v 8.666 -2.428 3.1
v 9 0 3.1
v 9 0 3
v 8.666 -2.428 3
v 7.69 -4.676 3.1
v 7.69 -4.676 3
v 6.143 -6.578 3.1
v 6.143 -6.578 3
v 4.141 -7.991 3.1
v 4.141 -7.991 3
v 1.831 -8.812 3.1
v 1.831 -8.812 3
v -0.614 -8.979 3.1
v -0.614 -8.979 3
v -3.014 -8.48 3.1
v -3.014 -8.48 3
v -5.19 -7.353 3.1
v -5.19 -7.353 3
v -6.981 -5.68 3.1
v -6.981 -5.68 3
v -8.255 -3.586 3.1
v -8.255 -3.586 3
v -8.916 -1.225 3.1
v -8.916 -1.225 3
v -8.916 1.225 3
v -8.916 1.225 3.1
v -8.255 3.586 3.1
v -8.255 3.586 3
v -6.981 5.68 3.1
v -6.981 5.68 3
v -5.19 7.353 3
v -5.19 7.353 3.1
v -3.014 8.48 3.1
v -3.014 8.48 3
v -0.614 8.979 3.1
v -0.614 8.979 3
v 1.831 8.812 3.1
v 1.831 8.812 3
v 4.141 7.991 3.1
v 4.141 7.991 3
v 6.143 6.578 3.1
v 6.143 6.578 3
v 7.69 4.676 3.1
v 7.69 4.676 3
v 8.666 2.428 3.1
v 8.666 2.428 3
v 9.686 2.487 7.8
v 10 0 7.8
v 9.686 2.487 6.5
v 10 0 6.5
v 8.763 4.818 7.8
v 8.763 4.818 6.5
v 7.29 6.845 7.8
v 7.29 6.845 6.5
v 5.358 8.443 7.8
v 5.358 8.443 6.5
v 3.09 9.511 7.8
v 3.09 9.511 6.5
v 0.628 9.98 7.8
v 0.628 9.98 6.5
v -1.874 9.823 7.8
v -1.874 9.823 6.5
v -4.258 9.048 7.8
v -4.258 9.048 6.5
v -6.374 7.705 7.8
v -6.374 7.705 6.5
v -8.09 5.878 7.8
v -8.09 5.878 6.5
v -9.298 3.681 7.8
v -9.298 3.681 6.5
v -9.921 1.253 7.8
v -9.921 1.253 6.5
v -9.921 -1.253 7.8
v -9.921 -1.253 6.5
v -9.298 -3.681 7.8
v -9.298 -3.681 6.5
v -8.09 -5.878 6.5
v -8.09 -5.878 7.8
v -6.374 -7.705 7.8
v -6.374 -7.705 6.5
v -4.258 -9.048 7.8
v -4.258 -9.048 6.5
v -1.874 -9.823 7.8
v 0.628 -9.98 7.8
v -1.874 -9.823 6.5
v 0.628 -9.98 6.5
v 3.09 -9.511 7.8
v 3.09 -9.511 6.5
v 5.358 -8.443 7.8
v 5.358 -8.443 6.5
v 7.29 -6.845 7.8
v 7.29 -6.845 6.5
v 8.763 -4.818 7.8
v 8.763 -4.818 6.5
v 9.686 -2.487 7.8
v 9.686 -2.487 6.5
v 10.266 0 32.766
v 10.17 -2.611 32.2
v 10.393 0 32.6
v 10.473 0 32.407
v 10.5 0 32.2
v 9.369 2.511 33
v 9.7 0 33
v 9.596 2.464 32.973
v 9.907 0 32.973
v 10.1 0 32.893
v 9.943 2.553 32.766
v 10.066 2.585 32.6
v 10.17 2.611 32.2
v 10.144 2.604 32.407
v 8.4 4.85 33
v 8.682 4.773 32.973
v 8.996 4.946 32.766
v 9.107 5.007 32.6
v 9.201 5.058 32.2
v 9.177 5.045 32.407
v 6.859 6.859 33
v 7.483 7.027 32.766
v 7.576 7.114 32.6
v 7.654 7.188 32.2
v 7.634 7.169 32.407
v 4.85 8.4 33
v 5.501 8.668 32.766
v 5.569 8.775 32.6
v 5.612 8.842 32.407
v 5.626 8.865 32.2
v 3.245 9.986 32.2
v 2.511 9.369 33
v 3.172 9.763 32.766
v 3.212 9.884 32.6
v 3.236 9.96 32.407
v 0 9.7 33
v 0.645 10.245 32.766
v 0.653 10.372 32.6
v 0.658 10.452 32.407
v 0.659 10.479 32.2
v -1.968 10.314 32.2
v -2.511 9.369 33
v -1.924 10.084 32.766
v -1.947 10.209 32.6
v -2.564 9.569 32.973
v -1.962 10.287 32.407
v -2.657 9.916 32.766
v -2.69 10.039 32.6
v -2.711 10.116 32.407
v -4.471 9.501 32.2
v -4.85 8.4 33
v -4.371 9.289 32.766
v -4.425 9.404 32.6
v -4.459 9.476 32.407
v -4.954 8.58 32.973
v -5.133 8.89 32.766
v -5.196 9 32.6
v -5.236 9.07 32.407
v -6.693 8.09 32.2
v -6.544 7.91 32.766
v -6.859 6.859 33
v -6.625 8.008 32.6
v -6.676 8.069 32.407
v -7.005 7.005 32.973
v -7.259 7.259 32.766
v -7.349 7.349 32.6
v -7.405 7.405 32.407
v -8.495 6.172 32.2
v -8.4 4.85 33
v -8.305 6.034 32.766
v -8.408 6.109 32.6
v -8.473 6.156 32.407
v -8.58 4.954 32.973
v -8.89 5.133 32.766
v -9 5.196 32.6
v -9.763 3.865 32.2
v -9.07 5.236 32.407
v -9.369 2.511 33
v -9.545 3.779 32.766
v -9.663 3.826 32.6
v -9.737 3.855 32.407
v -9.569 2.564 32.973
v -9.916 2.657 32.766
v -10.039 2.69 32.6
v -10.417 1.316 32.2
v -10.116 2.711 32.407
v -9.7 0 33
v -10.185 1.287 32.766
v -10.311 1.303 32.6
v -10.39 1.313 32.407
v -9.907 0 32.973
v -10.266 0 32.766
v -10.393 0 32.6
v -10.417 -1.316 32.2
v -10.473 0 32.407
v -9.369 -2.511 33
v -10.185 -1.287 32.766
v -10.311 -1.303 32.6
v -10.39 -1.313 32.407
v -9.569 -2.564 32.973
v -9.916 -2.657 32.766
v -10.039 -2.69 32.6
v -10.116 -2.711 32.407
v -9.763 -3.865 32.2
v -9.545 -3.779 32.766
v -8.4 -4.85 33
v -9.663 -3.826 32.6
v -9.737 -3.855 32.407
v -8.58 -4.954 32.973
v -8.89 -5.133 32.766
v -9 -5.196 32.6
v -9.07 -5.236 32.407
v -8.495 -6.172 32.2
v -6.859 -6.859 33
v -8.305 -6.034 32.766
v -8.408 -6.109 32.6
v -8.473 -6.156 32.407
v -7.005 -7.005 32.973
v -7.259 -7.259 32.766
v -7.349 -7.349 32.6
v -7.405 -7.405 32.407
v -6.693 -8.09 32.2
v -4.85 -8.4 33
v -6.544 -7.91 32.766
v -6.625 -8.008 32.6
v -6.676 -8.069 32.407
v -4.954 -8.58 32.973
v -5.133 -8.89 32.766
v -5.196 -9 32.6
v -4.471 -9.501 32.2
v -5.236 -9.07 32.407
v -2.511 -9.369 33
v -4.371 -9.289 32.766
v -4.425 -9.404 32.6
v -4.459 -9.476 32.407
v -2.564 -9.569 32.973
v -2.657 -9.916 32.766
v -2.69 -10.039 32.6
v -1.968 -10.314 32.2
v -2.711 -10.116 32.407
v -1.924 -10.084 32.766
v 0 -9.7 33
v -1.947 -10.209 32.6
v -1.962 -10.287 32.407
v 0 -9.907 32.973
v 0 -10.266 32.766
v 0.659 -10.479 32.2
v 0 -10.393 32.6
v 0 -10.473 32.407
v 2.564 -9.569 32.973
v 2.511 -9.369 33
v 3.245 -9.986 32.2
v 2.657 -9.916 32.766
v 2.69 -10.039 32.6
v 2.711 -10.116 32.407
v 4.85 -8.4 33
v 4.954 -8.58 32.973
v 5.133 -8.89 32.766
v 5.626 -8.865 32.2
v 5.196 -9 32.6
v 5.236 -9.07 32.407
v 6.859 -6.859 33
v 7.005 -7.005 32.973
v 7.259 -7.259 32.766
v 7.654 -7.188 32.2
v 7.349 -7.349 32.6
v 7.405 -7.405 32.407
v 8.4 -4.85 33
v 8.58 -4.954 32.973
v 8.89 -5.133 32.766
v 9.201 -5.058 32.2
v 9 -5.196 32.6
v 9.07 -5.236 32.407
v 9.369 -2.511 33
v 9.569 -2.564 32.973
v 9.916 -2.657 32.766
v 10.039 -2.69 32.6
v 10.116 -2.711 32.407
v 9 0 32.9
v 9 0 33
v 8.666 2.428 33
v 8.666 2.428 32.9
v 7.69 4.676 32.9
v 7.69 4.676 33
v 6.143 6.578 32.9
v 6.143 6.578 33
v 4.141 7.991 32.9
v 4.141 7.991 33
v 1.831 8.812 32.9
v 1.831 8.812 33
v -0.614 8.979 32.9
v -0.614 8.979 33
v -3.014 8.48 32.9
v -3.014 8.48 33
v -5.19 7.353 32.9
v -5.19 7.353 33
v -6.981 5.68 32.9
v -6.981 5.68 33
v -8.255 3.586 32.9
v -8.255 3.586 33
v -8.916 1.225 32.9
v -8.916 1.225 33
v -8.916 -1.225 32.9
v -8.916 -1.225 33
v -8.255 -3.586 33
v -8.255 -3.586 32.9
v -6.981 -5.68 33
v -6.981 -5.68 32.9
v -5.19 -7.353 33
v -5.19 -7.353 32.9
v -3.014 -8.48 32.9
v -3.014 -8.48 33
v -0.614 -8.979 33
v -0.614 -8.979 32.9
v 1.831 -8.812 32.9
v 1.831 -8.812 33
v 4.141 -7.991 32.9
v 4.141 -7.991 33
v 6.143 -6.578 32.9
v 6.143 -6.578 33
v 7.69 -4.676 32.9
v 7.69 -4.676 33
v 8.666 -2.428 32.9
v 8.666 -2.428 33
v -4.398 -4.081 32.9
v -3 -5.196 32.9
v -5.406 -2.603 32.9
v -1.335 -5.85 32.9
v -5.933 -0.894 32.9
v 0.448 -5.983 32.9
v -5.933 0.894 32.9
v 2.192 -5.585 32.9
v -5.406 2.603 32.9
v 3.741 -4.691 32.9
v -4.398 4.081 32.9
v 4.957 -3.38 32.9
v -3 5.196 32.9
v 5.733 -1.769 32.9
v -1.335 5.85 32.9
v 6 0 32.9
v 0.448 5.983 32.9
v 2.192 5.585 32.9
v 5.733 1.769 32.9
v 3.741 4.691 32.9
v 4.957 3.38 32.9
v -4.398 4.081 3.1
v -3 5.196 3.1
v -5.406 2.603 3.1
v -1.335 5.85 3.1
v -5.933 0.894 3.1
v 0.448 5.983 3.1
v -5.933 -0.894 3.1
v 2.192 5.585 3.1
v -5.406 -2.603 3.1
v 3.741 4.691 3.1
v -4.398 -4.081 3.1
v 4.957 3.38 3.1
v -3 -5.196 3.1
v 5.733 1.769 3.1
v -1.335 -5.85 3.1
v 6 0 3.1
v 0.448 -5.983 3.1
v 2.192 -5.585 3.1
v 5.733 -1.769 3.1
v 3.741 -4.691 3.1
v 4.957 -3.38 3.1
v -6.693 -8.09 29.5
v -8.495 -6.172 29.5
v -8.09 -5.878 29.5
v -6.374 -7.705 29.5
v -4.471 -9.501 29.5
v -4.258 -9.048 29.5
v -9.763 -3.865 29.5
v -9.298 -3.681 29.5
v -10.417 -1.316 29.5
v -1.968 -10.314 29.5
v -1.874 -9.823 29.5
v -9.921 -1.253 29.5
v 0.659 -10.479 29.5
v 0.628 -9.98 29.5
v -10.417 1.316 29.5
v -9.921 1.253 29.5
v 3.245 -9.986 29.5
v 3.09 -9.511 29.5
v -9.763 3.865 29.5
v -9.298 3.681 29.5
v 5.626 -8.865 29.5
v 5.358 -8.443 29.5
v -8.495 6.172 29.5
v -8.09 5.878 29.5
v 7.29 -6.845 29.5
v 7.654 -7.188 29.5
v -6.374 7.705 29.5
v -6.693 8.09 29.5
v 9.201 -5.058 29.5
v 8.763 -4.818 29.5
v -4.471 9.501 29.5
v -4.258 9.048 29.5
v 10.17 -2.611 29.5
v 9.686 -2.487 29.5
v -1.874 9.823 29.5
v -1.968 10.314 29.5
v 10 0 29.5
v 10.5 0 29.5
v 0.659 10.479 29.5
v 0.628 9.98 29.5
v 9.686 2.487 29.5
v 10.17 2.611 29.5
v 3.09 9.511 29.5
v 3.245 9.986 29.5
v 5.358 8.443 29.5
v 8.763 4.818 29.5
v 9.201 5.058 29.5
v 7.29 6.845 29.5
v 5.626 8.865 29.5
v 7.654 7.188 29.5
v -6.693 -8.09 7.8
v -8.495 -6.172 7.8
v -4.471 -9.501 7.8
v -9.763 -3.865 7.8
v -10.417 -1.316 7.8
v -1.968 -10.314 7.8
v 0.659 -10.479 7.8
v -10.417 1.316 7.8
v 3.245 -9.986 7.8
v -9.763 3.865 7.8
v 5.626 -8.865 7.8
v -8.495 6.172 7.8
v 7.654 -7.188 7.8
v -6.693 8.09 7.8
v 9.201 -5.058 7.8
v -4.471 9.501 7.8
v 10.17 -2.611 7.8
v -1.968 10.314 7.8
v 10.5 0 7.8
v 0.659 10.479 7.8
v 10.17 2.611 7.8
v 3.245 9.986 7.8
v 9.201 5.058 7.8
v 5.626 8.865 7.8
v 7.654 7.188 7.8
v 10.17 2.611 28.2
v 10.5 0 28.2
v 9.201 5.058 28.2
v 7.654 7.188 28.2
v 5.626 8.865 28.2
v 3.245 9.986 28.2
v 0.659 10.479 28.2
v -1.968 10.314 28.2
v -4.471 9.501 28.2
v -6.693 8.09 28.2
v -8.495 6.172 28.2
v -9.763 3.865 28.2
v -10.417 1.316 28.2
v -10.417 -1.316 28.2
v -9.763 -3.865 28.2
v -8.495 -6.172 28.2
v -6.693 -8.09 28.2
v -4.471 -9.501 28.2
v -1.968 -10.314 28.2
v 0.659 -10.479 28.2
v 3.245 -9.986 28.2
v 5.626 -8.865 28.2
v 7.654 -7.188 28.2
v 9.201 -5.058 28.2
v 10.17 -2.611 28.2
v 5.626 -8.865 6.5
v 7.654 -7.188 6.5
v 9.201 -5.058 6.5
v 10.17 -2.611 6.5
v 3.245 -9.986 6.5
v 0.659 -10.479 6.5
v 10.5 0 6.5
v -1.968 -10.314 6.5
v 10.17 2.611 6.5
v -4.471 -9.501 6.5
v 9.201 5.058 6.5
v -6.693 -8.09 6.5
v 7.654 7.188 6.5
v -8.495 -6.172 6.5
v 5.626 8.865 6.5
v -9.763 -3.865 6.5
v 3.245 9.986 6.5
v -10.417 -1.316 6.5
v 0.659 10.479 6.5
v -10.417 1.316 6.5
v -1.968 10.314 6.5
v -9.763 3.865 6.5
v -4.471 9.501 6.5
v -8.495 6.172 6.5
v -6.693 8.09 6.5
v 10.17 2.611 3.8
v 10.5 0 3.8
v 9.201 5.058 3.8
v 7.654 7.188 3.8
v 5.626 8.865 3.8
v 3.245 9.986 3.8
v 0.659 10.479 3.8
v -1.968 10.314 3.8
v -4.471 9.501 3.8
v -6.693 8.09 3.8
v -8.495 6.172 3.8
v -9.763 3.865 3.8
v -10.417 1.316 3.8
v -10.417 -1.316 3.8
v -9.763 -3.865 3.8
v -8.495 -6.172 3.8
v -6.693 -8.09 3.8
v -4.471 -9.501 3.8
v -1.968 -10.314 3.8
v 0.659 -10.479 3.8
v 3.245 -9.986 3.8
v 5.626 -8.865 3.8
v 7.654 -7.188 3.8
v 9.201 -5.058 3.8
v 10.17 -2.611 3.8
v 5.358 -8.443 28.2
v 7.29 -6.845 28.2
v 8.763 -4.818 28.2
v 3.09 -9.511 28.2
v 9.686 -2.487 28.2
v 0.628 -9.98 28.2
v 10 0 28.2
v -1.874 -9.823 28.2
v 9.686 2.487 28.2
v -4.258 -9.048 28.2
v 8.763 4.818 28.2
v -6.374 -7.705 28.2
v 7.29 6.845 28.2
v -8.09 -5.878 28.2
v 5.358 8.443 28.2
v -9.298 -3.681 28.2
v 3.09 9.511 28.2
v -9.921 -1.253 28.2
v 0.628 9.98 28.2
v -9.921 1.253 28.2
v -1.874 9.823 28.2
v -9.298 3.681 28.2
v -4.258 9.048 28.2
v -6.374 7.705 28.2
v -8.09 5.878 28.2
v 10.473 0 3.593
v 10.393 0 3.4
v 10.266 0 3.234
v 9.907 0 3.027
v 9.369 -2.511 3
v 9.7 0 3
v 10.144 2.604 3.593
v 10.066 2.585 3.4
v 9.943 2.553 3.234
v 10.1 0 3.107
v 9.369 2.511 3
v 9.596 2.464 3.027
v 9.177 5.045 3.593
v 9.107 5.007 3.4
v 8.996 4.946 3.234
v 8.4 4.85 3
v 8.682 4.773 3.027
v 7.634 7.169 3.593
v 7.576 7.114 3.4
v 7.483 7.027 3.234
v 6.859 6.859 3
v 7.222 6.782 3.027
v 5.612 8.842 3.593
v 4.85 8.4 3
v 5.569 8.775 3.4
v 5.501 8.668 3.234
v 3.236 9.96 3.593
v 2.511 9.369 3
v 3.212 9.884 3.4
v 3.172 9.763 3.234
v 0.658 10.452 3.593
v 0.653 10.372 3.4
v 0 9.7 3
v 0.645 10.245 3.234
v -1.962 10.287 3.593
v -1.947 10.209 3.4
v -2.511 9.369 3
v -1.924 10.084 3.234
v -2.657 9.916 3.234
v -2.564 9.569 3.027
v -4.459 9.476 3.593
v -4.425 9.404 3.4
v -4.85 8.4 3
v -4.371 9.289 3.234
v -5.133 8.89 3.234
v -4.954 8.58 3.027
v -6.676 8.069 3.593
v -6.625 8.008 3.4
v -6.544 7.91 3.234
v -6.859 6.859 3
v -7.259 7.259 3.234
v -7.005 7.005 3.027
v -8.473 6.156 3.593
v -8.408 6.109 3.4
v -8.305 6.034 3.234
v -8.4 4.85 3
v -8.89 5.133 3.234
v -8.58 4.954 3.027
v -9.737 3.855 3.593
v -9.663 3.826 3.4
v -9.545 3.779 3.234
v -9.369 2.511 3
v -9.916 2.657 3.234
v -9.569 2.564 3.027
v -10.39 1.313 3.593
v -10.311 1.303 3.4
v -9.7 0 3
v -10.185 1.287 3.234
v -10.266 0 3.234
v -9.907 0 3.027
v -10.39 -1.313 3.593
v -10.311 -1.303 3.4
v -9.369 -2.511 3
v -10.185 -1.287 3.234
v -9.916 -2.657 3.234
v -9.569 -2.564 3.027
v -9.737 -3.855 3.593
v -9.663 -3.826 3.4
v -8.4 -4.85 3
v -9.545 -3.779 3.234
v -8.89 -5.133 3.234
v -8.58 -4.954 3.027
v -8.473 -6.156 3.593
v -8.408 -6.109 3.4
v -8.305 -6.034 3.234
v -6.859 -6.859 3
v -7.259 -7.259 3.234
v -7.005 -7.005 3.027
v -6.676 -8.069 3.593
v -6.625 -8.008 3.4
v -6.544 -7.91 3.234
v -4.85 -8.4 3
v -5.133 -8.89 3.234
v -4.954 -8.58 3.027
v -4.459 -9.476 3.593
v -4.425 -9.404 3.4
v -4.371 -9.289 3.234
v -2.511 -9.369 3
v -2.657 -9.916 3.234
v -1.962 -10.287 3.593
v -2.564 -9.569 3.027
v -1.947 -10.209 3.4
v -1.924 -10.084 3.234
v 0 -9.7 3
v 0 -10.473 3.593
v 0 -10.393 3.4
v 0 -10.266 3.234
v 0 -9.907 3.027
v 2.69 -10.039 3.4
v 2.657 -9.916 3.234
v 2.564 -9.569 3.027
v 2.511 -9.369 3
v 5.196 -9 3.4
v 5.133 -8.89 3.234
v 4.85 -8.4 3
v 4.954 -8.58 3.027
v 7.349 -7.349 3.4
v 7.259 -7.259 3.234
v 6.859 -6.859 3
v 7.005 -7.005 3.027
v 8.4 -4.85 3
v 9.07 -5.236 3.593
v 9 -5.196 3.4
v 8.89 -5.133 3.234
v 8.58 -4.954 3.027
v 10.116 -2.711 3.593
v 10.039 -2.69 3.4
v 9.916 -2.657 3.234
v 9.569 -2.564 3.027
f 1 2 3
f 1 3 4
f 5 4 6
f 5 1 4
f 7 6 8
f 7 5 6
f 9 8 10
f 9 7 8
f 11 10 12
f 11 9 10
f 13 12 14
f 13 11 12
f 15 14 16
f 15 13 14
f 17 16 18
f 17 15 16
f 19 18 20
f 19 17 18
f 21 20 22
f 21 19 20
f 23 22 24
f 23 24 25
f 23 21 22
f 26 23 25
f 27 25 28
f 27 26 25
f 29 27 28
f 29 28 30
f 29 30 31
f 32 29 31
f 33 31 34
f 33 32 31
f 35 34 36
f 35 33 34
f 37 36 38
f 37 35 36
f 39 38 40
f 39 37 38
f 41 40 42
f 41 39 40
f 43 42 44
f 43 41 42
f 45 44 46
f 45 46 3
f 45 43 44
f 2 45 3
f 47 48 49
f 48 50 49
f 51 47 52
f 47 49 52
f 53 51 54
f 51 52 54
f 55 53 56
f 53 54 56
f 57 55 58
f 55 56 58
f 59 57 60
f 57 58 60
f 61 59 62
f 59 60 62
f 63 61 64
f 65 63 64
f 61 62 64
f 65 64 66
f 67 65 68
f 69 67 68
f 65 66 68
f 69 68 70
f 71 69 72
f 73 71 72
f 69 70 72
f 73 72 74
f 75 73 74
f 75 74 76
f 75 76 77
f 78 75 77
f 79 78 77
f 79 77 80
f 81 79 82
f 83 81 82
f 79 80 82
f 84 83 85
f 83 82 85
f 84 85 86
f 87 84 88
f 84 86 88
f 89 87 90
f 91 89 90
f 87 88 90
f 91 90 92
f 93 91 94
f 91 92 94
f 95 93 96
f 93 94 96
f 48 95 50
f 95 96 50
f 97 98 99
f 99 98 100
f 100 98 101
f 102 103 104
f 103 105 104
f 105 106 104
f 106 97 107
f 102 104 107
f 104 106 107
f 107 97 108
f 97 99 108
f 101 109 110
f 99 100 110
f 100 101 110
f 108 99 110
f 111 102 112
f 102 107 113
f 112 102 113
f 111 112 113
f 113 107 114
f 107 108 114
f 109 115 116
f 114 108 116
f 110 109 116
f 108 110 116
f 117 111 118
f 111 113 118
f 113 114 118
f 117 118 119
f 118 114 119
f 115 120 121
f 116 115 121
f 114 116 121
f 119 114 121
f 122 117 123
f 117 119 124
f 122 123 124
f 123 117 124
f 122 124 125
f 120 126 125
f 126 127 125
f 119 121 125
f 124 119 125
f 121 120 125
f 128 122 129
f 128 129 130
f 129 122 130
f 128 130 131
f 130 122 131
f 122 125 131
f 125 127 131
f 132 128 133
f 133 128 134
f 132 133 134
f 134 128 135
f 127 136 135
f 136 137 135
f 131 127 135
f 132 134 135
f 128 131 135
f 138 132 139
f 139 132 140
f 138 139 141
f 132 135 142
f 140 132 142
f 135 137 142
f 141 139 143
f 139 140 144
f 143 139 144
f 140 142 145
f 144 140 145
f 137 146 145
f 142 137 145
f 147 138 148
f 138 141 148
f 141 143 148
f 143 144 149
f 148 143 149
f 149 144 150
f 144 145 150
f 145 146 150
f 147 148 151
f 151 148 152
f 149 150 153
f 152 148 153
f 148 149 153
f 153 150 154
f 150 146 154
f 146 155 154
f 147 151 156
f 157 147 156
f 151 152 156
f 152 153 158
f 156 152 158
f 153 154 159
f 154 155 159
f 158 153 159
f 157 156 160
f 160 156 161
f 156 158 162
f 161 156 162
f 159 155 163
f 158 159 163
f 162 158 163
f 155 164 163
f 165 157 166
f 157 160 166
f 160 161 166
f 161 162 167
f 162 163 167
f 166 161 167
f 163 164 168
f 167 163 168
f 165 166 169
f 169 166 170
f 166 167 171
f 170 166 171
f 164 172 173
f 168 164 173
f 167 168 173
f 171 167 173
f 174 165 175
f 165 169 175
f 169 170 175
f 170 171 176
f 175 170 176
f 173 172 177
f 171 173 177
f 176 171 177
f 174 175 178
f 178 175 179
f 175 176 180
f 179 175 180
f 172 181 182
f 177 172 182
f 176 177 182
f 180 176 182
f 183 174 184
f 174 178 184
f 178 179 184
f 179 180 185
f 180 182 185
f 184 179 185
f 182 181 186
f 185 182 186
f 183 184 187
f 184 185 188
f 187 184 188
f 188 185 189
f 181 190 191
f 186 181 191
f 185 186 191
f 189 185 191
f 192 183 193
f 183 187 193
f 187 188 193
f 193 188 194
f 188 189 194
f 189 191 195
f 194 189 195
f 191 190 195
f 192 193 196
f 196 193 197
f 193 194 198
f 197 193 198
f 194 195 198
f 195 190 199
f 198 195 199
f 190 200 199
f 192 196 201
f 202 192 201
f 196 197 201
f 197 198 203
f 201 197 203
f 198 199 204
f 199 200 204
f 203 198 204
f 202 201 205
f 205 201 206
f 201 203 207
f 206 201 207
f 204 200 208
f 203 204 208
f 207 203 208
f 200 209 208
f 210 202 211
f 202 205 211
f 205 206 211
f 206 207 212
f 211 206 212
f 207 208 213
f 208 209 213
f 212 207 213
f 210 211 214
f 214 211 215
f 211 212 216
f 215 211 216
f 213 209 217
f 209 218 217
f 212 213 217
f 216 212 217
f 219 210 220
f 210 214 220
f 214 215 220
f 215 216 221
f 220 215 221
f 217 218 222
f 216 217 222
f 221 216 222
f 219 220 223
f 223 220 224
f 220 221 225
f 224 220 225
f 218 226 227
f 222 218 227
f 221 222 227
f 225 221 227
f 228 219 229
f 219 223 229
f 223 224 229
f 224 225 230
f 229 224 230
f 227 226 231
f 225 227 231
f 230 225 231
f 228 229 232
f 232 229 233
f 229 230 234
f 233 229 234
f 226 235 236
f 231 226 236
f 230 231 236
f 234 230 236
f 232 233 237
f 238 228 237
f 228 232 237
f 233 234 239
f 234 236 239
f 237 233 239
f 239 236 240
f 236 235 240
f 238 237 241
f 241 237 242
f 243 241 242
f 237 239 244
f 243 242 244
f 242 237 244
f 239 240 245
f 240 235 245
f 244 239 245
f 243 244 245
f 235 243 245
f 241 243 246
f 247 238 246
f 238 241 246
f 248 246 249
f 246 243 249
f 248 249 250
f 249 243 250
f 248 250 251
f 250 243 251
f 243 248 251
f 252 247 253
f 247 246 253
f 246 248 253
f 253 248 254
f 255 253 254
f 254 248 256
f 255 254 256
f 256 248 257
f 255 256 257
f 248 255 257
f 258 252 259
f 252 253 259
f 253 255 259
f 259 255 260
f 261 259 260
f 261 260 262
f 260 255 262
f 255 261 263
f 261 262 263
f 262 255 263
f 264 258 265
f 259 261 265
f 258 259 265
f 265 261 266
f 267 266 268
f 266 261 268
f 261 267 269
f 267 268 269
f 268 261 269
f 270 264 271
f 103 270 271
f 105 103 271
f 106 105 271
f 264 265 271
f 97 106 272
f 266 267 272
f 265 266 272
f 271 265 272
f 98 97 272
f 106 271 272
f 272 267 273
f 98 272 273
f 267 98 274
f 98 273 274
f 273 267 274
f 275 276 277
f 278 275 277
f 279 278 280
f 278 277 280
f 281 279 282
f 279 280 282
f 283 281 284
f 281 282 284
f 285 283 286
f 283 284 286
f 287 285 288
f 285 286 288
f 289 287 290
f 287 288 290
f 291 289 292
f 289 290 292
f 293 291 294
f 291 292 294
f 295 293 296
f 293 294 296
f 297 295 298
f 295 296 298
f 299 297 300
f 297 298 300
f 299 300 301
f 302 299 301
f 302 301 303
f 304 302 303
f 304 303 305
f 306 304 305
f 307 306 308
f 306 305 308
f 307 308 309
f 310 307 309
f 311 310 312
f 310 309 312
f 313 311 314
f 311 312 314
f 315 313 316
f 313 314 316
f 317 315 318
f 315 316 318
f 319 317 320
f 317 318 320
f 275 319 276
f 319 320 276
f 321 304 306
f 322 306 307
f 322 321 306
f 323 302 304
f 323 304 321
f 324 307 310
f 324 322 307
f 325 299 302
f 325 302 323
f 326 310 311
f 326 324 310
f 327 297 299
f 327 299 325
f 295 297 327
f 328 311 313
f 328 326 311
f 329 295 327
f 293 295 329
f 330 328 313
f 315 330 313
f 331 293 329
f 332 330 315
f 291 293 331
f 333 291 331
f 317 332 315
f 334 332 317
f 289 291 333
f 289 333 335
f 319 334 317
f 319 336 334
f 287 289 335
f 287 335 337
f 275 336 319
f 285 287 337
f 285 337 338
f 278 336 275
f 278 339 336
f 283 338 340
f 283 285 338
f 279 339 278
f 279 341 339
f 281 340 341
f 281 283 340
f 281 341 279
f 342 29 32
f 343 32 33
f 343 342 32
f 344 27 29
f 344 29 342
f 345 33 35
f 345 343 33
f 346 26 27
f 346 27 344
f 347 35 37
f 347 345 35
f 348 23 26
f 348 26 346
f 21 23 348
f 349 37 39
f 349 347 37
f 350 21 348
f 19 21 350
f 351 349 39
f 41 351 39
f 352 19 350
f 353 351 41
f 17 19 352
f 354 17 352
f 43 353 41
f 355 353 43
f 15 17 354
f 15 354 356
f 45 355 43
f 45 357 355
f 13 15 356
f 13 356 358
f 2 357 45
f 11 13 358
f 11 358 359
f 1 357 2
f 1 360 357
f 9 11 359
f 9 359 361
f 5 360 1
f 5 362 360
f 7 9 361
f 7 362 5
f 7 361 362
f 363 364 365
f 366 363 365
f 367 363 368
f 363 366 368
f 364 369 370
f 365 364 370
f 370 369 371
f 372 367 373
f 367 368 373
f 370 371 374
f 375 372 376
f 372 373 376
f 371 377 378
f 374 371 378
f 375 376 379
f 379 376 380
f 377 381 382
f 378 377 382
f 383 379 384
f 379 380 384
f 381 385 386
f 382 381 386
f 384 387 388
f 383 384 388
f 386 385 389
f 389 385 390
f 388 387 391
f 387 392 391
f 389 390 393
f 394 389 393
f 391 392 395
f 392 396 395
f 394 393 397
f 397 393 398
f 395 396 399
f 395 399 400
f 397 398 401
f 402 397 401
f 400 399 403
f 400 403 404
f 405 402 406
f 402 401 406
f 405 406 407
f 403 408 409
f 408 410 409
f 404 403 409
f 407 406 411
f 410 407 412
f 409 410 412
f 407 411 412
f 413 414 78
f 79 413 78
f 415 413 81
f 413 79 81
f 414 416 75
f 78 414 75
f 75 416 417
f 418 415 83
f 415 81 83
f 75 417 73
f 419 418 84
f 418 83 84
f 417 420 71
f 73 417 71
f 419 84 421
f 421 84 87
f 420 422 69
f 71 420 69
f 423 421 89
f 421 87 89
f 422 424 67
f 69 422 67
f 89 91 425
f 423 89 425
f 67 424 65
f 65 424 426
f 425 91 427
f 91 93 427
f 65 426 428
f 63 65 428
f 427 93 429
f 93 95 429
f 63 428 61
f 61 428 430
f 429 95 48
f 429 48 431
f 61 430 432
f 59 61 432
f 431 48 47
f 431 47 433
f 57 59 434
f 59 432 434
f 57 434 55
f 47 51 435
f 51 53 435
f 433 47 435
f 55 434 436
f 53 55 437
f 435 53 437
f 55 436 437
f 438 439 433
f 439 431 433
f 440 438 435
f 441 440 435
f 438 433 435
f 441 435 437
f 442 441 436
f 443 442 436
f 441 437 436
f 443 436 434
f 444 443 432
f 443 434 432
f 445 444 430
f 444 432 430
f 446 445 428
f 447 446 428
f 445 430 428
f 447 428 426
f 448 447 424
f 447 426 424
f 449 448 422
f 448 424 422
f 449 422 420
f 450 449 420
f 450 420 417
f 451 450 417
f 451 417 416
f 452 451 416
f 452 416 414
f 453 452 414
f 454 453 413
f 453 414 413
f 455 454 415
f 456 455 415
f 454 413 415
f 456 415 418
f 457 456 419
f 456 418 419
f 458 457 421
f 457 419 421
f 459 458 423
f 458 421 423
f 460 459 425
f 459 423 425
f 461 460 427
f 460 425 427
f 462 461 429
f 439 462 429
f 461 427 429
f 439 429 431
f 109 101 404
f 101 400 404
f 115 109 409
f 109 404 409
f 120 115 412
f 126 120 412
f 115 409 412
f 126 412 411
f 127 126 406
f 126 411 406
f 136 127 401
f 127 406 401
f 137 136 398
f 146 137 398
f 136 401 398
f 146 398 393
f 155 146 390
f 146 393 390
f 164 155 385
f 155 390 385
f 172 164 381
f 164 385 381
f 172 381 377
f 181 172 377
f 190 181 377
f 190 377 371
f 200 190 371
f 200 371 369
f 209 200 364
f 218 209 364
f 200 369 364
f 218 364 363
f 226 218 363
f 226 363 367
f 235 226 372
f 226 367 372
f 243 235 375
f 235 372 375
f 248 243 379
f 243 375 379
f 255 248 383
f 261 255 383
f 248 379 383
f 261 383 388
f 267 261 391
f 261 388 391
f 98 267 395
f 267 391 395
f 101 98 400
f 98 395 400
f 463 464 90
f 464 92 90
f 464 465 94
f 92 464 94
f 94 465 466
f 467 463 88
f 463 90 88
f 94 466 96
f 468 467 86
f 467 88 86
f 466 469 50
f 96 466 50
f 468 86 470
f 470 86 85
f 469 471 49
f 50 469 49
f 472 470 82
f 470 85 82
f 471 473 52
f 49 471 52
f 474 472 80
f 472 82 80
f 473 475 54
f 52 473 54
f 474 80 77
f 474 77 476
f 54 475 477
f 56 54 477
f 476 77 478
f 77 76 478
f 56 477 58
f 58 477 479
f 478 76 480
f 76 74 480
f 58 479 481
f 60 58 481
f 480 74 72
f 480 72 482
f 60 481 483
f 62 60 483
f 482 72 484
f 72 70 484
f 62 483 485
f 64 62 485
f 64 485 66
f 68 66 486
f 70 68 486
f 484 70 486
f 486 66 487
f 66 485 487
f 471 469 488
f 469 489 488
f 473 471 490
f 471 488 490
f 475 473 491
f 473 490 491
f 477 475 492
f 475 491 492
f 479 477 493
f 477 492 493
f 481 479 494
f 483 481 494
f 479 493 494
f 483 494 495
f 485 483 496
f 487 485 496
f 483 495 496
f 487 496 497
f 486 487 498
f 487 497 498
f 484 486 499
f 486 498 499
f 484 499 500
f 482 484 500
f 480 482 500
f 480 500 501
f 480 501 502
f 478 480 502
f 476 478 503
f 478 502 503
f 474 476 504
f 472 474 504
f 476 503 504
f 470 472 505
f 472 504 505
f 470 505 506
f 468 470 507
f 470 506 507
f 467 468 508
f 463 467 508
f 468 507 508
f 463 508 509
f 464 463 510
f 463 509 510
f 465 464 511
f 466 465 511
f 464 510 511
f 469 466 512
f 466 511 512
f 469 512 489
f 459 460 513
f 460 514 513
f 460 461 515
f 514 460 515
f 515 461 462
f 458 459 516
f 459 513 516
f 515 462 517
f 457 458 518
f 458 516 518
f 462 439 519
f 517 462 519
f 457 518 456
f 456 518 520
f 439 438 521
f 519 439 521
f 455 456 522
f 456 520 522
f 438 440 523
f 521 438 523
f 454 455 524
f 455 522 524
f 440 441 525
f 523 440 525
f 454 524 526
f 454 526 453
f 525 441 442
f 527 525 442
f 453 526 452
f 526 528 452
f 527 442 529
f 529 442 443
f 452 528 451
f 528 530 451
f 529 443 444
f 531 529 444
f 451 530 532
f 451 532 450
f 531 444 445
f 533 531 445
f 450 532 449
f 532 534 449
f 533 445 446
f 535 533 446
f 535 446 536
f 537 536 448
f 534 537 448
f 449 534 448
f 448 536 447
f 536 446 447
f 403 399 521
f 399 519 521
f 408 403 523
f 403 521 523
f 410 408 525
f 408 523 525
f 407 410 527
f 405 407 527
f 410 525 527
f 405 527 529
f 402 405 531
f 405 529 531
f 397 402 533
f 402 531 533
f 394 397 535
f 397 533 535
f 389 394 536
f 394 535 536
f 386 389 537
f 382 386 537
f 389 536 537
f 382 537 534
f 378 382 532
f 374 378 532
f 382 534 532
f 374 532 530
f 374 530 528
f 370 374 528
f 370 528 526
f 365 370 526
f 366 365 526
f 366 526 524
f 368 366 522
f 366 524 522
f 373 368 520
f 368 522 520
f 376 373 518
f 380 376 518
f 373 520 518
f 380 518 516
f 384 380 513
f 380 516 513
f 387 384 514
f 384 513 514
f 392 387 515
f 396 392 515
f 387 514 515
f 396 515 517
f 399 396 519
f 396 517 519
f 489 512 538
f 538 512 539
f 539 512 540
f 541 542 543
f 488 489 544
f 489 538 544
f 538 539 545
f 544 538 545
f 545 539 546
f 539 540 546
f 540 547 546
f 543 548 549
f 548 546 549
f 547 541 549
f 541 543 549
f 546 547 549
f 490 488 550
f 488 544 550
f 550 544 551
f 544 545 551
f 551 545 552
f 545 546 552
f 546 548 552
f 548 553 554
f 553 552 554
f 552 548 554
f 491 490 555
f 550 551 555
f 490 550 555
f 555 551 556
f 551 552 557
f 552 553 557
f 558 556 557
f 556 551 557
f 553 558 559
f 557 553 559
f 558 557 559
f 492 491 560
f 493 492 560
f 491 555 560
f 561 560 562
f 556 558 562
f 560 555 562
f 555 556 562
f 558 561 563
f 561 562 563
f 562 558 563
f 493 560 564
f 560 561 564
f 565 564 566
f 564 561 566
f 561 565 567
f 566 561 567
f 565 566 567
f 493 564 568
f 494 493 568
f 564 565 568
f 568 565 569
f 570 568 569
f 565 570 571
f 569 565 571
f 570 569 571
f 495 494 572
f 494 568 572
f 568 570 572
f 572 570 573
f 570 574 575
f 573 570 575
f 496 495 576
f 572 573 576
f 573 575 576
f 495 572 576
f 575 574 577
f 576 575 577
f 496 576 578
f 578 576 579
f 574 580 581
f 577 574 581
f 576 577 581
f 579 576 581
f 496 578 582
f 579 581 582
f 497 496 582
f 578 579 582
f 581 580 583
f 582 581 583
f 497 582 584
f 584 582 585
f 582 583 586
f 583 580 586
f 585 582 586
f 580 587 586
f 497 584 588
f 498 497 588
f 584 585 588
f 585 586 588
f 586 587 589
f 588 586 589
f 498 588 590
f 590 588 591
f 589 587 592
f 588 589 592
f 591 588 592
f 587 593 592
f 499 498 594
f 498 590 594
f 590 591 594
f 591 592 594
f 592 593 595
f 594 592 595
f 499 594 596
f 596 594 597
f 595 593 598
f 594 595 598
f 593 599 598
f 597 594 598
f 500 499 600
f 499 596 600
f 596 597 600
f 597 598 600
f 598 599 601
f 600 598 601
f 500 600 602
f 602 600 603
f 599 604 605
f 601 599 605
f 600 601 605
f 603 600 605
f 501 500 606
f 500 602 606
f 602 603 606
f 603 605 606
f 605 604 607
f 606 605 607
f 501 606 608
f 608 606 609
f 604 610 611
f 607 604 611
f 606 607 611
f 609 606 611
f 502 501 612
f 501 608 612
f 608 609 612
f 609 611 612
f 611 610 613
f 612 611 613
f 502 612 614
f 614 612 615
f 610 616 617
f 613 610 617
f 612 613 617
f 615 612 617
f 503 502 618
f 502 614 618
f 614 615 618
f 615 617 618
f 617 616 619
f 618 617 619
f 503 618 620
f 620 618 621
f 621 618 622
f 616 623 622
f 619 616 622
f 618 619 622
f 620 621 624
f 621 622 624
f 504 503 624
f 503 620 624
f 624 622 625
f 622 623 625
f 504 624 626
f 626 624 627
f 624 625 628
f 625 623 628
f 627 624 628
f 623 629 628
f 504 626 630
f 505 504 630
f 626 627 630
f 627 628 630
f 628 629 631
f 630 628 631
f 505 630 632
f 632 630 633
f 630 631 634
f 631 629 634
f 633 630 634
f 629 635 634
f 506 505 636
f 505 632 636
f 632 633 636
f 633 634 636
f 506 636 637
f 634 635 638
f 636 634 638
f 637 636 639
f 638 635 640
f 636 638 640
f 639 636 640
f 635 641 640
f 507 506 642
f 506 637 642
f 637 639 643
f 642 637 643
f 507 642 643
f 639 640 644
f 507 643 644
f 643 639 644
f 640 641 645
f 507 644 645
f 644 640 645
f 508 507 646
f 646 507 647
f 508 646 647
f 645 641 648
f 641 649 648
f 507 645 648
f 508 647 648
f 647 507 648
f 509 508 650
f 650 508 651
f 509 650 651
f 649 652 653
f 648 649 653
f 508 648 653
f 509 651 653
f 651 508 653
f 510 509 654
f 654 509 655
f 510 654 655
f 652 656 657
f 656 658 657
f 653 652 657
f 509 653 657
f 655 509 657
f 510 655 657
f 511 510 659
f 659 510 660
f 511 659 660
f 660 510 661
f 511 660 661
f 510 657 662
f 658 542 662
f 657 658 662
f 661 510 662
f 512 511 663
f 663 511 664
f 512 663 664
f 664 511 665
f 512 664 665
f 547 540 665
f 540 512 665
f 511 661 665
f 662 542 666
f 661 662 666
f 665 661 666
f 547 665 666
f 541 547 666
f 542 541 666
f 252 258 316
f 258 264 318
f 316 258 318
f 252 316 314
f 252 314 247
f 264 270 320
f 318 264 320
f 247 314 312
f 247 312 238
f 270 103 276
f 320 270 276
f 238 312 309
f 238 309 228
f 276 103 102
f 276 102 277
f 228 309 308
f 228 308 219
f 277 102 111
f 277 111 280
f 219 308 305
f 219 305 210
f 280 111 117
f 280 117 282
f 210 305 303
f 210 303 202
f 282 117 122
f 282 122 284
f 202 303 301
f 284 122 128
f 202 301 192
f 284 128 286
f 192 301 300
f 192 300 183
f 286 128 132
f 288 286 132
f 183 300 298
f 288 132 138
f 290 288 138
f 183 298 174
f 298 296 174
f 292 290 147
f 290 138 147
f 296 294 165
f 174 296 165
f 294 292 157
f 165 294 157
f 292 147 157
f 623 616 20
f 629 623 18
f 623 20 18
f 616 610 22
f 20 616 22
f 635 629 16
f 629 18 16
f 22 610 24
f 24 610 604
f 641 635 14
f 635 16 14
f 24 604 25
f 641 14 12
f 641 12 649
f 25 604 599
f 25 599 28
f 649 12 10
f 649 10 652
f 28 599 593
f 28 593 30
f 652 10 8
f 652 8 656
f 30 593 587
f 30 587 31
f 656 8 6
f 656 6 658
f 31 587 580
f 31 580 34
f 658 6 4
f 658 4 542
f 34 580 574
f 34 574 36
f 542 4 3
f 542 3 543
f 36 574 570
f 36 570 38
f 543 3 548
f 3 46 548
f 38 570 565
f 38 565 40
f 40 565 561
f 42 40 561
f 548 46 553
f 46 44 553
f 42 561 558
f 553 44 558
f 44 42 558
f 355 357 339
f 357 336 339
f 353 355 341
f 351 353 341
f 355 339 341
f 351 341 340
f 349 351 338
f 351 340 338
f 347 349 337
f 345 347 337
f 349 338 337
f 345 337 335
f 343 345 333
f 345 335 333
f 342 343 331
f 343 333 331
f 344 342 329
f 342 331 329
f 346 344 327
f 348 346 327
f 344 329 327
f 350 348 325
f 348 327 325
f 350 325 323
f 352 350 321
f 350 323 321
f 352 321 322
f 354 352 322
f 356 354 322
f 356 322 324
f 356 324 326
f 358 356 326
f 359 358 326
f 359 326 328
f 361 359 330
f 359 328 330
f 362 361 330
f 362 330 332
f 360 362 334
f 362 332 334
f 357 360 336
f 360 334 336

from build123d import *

# Parameters (mm, degrees)
ESBO_O2_R             = 9
CORTE_EXTRUS_O1_DEPTH = 0.1
CORTE_EXTRUS_O2_START = -0.1
ESBO_O3_R             = 9
CORTE_EXTRUS_O2_DEPTH = 0.1


with BuildPart() as part:
    # Esboço1 → Revolução1 (revolve)
    with BuildSketch(Plane(origin=(0, 0, 0), x_dir=(1, 0, 0), z_dir=(0, 1, 0))):
        with BuildLine():
            Line((9.7, -3), (6, -3))
            Line((6, -3), (6, -33))
            Line((6, -33), (9.7, -33))
            ThreePointArc((9.7, -33), (10.265685425, -32.765685425), (10.5, -32.2))
            Line((10.5, -32.2), (10.5, -29.5))
            Line((10.5, -29.5), (10, -29.5))
            Line((10, -29.5), (10, -28.2))
            Line((10, -28.2), (10.5, -28.2))
            Line((10.5, -28.2), (10.5, -7.8))
            Line((10.5, -7.8), (10, -7.8))
            Line((10, -7.8), (10, -6.5))
            Line((10, -6.5), (10.5, -6.5))
            Line((10.5, -6.5), (10.5, -3.8))
            ThreePointArc((10.5, -3.8), (10.265685425, -3.234314575), (9.7, -3))
        make_face()
    revolve(axis=Axis((0, 0, 2.998746006), (0, 0, 1)))

    # Esboço2 → Corte-extrusão1 (cut)
    with BuildSketch(Plane.XY.offset(33)):
        Circle(ESBO_O2_R)
    extrude(amount=-CORTE_EXTRUS_O1_DEPTH, mode=Mode.SUBTRACT)

    # Esboço3 → Corte-extrusão2 (cut)
    with BuildSketch(Plane(origin=(0, 0, 3), x_dir=(-1, 0, 0), z_dir=(0, 0, -1)).offset(CORTE_EXTRUS_O2_START)):
        with Locations(Location((0, 0, 0), (0, 0, 180))):
            Circle(ESBO_O3_R)
    extrude(amount=CORTE_EXTRUS_O2_DEPTH, mode=Mode.SUBTRACT)


solid = part.part
